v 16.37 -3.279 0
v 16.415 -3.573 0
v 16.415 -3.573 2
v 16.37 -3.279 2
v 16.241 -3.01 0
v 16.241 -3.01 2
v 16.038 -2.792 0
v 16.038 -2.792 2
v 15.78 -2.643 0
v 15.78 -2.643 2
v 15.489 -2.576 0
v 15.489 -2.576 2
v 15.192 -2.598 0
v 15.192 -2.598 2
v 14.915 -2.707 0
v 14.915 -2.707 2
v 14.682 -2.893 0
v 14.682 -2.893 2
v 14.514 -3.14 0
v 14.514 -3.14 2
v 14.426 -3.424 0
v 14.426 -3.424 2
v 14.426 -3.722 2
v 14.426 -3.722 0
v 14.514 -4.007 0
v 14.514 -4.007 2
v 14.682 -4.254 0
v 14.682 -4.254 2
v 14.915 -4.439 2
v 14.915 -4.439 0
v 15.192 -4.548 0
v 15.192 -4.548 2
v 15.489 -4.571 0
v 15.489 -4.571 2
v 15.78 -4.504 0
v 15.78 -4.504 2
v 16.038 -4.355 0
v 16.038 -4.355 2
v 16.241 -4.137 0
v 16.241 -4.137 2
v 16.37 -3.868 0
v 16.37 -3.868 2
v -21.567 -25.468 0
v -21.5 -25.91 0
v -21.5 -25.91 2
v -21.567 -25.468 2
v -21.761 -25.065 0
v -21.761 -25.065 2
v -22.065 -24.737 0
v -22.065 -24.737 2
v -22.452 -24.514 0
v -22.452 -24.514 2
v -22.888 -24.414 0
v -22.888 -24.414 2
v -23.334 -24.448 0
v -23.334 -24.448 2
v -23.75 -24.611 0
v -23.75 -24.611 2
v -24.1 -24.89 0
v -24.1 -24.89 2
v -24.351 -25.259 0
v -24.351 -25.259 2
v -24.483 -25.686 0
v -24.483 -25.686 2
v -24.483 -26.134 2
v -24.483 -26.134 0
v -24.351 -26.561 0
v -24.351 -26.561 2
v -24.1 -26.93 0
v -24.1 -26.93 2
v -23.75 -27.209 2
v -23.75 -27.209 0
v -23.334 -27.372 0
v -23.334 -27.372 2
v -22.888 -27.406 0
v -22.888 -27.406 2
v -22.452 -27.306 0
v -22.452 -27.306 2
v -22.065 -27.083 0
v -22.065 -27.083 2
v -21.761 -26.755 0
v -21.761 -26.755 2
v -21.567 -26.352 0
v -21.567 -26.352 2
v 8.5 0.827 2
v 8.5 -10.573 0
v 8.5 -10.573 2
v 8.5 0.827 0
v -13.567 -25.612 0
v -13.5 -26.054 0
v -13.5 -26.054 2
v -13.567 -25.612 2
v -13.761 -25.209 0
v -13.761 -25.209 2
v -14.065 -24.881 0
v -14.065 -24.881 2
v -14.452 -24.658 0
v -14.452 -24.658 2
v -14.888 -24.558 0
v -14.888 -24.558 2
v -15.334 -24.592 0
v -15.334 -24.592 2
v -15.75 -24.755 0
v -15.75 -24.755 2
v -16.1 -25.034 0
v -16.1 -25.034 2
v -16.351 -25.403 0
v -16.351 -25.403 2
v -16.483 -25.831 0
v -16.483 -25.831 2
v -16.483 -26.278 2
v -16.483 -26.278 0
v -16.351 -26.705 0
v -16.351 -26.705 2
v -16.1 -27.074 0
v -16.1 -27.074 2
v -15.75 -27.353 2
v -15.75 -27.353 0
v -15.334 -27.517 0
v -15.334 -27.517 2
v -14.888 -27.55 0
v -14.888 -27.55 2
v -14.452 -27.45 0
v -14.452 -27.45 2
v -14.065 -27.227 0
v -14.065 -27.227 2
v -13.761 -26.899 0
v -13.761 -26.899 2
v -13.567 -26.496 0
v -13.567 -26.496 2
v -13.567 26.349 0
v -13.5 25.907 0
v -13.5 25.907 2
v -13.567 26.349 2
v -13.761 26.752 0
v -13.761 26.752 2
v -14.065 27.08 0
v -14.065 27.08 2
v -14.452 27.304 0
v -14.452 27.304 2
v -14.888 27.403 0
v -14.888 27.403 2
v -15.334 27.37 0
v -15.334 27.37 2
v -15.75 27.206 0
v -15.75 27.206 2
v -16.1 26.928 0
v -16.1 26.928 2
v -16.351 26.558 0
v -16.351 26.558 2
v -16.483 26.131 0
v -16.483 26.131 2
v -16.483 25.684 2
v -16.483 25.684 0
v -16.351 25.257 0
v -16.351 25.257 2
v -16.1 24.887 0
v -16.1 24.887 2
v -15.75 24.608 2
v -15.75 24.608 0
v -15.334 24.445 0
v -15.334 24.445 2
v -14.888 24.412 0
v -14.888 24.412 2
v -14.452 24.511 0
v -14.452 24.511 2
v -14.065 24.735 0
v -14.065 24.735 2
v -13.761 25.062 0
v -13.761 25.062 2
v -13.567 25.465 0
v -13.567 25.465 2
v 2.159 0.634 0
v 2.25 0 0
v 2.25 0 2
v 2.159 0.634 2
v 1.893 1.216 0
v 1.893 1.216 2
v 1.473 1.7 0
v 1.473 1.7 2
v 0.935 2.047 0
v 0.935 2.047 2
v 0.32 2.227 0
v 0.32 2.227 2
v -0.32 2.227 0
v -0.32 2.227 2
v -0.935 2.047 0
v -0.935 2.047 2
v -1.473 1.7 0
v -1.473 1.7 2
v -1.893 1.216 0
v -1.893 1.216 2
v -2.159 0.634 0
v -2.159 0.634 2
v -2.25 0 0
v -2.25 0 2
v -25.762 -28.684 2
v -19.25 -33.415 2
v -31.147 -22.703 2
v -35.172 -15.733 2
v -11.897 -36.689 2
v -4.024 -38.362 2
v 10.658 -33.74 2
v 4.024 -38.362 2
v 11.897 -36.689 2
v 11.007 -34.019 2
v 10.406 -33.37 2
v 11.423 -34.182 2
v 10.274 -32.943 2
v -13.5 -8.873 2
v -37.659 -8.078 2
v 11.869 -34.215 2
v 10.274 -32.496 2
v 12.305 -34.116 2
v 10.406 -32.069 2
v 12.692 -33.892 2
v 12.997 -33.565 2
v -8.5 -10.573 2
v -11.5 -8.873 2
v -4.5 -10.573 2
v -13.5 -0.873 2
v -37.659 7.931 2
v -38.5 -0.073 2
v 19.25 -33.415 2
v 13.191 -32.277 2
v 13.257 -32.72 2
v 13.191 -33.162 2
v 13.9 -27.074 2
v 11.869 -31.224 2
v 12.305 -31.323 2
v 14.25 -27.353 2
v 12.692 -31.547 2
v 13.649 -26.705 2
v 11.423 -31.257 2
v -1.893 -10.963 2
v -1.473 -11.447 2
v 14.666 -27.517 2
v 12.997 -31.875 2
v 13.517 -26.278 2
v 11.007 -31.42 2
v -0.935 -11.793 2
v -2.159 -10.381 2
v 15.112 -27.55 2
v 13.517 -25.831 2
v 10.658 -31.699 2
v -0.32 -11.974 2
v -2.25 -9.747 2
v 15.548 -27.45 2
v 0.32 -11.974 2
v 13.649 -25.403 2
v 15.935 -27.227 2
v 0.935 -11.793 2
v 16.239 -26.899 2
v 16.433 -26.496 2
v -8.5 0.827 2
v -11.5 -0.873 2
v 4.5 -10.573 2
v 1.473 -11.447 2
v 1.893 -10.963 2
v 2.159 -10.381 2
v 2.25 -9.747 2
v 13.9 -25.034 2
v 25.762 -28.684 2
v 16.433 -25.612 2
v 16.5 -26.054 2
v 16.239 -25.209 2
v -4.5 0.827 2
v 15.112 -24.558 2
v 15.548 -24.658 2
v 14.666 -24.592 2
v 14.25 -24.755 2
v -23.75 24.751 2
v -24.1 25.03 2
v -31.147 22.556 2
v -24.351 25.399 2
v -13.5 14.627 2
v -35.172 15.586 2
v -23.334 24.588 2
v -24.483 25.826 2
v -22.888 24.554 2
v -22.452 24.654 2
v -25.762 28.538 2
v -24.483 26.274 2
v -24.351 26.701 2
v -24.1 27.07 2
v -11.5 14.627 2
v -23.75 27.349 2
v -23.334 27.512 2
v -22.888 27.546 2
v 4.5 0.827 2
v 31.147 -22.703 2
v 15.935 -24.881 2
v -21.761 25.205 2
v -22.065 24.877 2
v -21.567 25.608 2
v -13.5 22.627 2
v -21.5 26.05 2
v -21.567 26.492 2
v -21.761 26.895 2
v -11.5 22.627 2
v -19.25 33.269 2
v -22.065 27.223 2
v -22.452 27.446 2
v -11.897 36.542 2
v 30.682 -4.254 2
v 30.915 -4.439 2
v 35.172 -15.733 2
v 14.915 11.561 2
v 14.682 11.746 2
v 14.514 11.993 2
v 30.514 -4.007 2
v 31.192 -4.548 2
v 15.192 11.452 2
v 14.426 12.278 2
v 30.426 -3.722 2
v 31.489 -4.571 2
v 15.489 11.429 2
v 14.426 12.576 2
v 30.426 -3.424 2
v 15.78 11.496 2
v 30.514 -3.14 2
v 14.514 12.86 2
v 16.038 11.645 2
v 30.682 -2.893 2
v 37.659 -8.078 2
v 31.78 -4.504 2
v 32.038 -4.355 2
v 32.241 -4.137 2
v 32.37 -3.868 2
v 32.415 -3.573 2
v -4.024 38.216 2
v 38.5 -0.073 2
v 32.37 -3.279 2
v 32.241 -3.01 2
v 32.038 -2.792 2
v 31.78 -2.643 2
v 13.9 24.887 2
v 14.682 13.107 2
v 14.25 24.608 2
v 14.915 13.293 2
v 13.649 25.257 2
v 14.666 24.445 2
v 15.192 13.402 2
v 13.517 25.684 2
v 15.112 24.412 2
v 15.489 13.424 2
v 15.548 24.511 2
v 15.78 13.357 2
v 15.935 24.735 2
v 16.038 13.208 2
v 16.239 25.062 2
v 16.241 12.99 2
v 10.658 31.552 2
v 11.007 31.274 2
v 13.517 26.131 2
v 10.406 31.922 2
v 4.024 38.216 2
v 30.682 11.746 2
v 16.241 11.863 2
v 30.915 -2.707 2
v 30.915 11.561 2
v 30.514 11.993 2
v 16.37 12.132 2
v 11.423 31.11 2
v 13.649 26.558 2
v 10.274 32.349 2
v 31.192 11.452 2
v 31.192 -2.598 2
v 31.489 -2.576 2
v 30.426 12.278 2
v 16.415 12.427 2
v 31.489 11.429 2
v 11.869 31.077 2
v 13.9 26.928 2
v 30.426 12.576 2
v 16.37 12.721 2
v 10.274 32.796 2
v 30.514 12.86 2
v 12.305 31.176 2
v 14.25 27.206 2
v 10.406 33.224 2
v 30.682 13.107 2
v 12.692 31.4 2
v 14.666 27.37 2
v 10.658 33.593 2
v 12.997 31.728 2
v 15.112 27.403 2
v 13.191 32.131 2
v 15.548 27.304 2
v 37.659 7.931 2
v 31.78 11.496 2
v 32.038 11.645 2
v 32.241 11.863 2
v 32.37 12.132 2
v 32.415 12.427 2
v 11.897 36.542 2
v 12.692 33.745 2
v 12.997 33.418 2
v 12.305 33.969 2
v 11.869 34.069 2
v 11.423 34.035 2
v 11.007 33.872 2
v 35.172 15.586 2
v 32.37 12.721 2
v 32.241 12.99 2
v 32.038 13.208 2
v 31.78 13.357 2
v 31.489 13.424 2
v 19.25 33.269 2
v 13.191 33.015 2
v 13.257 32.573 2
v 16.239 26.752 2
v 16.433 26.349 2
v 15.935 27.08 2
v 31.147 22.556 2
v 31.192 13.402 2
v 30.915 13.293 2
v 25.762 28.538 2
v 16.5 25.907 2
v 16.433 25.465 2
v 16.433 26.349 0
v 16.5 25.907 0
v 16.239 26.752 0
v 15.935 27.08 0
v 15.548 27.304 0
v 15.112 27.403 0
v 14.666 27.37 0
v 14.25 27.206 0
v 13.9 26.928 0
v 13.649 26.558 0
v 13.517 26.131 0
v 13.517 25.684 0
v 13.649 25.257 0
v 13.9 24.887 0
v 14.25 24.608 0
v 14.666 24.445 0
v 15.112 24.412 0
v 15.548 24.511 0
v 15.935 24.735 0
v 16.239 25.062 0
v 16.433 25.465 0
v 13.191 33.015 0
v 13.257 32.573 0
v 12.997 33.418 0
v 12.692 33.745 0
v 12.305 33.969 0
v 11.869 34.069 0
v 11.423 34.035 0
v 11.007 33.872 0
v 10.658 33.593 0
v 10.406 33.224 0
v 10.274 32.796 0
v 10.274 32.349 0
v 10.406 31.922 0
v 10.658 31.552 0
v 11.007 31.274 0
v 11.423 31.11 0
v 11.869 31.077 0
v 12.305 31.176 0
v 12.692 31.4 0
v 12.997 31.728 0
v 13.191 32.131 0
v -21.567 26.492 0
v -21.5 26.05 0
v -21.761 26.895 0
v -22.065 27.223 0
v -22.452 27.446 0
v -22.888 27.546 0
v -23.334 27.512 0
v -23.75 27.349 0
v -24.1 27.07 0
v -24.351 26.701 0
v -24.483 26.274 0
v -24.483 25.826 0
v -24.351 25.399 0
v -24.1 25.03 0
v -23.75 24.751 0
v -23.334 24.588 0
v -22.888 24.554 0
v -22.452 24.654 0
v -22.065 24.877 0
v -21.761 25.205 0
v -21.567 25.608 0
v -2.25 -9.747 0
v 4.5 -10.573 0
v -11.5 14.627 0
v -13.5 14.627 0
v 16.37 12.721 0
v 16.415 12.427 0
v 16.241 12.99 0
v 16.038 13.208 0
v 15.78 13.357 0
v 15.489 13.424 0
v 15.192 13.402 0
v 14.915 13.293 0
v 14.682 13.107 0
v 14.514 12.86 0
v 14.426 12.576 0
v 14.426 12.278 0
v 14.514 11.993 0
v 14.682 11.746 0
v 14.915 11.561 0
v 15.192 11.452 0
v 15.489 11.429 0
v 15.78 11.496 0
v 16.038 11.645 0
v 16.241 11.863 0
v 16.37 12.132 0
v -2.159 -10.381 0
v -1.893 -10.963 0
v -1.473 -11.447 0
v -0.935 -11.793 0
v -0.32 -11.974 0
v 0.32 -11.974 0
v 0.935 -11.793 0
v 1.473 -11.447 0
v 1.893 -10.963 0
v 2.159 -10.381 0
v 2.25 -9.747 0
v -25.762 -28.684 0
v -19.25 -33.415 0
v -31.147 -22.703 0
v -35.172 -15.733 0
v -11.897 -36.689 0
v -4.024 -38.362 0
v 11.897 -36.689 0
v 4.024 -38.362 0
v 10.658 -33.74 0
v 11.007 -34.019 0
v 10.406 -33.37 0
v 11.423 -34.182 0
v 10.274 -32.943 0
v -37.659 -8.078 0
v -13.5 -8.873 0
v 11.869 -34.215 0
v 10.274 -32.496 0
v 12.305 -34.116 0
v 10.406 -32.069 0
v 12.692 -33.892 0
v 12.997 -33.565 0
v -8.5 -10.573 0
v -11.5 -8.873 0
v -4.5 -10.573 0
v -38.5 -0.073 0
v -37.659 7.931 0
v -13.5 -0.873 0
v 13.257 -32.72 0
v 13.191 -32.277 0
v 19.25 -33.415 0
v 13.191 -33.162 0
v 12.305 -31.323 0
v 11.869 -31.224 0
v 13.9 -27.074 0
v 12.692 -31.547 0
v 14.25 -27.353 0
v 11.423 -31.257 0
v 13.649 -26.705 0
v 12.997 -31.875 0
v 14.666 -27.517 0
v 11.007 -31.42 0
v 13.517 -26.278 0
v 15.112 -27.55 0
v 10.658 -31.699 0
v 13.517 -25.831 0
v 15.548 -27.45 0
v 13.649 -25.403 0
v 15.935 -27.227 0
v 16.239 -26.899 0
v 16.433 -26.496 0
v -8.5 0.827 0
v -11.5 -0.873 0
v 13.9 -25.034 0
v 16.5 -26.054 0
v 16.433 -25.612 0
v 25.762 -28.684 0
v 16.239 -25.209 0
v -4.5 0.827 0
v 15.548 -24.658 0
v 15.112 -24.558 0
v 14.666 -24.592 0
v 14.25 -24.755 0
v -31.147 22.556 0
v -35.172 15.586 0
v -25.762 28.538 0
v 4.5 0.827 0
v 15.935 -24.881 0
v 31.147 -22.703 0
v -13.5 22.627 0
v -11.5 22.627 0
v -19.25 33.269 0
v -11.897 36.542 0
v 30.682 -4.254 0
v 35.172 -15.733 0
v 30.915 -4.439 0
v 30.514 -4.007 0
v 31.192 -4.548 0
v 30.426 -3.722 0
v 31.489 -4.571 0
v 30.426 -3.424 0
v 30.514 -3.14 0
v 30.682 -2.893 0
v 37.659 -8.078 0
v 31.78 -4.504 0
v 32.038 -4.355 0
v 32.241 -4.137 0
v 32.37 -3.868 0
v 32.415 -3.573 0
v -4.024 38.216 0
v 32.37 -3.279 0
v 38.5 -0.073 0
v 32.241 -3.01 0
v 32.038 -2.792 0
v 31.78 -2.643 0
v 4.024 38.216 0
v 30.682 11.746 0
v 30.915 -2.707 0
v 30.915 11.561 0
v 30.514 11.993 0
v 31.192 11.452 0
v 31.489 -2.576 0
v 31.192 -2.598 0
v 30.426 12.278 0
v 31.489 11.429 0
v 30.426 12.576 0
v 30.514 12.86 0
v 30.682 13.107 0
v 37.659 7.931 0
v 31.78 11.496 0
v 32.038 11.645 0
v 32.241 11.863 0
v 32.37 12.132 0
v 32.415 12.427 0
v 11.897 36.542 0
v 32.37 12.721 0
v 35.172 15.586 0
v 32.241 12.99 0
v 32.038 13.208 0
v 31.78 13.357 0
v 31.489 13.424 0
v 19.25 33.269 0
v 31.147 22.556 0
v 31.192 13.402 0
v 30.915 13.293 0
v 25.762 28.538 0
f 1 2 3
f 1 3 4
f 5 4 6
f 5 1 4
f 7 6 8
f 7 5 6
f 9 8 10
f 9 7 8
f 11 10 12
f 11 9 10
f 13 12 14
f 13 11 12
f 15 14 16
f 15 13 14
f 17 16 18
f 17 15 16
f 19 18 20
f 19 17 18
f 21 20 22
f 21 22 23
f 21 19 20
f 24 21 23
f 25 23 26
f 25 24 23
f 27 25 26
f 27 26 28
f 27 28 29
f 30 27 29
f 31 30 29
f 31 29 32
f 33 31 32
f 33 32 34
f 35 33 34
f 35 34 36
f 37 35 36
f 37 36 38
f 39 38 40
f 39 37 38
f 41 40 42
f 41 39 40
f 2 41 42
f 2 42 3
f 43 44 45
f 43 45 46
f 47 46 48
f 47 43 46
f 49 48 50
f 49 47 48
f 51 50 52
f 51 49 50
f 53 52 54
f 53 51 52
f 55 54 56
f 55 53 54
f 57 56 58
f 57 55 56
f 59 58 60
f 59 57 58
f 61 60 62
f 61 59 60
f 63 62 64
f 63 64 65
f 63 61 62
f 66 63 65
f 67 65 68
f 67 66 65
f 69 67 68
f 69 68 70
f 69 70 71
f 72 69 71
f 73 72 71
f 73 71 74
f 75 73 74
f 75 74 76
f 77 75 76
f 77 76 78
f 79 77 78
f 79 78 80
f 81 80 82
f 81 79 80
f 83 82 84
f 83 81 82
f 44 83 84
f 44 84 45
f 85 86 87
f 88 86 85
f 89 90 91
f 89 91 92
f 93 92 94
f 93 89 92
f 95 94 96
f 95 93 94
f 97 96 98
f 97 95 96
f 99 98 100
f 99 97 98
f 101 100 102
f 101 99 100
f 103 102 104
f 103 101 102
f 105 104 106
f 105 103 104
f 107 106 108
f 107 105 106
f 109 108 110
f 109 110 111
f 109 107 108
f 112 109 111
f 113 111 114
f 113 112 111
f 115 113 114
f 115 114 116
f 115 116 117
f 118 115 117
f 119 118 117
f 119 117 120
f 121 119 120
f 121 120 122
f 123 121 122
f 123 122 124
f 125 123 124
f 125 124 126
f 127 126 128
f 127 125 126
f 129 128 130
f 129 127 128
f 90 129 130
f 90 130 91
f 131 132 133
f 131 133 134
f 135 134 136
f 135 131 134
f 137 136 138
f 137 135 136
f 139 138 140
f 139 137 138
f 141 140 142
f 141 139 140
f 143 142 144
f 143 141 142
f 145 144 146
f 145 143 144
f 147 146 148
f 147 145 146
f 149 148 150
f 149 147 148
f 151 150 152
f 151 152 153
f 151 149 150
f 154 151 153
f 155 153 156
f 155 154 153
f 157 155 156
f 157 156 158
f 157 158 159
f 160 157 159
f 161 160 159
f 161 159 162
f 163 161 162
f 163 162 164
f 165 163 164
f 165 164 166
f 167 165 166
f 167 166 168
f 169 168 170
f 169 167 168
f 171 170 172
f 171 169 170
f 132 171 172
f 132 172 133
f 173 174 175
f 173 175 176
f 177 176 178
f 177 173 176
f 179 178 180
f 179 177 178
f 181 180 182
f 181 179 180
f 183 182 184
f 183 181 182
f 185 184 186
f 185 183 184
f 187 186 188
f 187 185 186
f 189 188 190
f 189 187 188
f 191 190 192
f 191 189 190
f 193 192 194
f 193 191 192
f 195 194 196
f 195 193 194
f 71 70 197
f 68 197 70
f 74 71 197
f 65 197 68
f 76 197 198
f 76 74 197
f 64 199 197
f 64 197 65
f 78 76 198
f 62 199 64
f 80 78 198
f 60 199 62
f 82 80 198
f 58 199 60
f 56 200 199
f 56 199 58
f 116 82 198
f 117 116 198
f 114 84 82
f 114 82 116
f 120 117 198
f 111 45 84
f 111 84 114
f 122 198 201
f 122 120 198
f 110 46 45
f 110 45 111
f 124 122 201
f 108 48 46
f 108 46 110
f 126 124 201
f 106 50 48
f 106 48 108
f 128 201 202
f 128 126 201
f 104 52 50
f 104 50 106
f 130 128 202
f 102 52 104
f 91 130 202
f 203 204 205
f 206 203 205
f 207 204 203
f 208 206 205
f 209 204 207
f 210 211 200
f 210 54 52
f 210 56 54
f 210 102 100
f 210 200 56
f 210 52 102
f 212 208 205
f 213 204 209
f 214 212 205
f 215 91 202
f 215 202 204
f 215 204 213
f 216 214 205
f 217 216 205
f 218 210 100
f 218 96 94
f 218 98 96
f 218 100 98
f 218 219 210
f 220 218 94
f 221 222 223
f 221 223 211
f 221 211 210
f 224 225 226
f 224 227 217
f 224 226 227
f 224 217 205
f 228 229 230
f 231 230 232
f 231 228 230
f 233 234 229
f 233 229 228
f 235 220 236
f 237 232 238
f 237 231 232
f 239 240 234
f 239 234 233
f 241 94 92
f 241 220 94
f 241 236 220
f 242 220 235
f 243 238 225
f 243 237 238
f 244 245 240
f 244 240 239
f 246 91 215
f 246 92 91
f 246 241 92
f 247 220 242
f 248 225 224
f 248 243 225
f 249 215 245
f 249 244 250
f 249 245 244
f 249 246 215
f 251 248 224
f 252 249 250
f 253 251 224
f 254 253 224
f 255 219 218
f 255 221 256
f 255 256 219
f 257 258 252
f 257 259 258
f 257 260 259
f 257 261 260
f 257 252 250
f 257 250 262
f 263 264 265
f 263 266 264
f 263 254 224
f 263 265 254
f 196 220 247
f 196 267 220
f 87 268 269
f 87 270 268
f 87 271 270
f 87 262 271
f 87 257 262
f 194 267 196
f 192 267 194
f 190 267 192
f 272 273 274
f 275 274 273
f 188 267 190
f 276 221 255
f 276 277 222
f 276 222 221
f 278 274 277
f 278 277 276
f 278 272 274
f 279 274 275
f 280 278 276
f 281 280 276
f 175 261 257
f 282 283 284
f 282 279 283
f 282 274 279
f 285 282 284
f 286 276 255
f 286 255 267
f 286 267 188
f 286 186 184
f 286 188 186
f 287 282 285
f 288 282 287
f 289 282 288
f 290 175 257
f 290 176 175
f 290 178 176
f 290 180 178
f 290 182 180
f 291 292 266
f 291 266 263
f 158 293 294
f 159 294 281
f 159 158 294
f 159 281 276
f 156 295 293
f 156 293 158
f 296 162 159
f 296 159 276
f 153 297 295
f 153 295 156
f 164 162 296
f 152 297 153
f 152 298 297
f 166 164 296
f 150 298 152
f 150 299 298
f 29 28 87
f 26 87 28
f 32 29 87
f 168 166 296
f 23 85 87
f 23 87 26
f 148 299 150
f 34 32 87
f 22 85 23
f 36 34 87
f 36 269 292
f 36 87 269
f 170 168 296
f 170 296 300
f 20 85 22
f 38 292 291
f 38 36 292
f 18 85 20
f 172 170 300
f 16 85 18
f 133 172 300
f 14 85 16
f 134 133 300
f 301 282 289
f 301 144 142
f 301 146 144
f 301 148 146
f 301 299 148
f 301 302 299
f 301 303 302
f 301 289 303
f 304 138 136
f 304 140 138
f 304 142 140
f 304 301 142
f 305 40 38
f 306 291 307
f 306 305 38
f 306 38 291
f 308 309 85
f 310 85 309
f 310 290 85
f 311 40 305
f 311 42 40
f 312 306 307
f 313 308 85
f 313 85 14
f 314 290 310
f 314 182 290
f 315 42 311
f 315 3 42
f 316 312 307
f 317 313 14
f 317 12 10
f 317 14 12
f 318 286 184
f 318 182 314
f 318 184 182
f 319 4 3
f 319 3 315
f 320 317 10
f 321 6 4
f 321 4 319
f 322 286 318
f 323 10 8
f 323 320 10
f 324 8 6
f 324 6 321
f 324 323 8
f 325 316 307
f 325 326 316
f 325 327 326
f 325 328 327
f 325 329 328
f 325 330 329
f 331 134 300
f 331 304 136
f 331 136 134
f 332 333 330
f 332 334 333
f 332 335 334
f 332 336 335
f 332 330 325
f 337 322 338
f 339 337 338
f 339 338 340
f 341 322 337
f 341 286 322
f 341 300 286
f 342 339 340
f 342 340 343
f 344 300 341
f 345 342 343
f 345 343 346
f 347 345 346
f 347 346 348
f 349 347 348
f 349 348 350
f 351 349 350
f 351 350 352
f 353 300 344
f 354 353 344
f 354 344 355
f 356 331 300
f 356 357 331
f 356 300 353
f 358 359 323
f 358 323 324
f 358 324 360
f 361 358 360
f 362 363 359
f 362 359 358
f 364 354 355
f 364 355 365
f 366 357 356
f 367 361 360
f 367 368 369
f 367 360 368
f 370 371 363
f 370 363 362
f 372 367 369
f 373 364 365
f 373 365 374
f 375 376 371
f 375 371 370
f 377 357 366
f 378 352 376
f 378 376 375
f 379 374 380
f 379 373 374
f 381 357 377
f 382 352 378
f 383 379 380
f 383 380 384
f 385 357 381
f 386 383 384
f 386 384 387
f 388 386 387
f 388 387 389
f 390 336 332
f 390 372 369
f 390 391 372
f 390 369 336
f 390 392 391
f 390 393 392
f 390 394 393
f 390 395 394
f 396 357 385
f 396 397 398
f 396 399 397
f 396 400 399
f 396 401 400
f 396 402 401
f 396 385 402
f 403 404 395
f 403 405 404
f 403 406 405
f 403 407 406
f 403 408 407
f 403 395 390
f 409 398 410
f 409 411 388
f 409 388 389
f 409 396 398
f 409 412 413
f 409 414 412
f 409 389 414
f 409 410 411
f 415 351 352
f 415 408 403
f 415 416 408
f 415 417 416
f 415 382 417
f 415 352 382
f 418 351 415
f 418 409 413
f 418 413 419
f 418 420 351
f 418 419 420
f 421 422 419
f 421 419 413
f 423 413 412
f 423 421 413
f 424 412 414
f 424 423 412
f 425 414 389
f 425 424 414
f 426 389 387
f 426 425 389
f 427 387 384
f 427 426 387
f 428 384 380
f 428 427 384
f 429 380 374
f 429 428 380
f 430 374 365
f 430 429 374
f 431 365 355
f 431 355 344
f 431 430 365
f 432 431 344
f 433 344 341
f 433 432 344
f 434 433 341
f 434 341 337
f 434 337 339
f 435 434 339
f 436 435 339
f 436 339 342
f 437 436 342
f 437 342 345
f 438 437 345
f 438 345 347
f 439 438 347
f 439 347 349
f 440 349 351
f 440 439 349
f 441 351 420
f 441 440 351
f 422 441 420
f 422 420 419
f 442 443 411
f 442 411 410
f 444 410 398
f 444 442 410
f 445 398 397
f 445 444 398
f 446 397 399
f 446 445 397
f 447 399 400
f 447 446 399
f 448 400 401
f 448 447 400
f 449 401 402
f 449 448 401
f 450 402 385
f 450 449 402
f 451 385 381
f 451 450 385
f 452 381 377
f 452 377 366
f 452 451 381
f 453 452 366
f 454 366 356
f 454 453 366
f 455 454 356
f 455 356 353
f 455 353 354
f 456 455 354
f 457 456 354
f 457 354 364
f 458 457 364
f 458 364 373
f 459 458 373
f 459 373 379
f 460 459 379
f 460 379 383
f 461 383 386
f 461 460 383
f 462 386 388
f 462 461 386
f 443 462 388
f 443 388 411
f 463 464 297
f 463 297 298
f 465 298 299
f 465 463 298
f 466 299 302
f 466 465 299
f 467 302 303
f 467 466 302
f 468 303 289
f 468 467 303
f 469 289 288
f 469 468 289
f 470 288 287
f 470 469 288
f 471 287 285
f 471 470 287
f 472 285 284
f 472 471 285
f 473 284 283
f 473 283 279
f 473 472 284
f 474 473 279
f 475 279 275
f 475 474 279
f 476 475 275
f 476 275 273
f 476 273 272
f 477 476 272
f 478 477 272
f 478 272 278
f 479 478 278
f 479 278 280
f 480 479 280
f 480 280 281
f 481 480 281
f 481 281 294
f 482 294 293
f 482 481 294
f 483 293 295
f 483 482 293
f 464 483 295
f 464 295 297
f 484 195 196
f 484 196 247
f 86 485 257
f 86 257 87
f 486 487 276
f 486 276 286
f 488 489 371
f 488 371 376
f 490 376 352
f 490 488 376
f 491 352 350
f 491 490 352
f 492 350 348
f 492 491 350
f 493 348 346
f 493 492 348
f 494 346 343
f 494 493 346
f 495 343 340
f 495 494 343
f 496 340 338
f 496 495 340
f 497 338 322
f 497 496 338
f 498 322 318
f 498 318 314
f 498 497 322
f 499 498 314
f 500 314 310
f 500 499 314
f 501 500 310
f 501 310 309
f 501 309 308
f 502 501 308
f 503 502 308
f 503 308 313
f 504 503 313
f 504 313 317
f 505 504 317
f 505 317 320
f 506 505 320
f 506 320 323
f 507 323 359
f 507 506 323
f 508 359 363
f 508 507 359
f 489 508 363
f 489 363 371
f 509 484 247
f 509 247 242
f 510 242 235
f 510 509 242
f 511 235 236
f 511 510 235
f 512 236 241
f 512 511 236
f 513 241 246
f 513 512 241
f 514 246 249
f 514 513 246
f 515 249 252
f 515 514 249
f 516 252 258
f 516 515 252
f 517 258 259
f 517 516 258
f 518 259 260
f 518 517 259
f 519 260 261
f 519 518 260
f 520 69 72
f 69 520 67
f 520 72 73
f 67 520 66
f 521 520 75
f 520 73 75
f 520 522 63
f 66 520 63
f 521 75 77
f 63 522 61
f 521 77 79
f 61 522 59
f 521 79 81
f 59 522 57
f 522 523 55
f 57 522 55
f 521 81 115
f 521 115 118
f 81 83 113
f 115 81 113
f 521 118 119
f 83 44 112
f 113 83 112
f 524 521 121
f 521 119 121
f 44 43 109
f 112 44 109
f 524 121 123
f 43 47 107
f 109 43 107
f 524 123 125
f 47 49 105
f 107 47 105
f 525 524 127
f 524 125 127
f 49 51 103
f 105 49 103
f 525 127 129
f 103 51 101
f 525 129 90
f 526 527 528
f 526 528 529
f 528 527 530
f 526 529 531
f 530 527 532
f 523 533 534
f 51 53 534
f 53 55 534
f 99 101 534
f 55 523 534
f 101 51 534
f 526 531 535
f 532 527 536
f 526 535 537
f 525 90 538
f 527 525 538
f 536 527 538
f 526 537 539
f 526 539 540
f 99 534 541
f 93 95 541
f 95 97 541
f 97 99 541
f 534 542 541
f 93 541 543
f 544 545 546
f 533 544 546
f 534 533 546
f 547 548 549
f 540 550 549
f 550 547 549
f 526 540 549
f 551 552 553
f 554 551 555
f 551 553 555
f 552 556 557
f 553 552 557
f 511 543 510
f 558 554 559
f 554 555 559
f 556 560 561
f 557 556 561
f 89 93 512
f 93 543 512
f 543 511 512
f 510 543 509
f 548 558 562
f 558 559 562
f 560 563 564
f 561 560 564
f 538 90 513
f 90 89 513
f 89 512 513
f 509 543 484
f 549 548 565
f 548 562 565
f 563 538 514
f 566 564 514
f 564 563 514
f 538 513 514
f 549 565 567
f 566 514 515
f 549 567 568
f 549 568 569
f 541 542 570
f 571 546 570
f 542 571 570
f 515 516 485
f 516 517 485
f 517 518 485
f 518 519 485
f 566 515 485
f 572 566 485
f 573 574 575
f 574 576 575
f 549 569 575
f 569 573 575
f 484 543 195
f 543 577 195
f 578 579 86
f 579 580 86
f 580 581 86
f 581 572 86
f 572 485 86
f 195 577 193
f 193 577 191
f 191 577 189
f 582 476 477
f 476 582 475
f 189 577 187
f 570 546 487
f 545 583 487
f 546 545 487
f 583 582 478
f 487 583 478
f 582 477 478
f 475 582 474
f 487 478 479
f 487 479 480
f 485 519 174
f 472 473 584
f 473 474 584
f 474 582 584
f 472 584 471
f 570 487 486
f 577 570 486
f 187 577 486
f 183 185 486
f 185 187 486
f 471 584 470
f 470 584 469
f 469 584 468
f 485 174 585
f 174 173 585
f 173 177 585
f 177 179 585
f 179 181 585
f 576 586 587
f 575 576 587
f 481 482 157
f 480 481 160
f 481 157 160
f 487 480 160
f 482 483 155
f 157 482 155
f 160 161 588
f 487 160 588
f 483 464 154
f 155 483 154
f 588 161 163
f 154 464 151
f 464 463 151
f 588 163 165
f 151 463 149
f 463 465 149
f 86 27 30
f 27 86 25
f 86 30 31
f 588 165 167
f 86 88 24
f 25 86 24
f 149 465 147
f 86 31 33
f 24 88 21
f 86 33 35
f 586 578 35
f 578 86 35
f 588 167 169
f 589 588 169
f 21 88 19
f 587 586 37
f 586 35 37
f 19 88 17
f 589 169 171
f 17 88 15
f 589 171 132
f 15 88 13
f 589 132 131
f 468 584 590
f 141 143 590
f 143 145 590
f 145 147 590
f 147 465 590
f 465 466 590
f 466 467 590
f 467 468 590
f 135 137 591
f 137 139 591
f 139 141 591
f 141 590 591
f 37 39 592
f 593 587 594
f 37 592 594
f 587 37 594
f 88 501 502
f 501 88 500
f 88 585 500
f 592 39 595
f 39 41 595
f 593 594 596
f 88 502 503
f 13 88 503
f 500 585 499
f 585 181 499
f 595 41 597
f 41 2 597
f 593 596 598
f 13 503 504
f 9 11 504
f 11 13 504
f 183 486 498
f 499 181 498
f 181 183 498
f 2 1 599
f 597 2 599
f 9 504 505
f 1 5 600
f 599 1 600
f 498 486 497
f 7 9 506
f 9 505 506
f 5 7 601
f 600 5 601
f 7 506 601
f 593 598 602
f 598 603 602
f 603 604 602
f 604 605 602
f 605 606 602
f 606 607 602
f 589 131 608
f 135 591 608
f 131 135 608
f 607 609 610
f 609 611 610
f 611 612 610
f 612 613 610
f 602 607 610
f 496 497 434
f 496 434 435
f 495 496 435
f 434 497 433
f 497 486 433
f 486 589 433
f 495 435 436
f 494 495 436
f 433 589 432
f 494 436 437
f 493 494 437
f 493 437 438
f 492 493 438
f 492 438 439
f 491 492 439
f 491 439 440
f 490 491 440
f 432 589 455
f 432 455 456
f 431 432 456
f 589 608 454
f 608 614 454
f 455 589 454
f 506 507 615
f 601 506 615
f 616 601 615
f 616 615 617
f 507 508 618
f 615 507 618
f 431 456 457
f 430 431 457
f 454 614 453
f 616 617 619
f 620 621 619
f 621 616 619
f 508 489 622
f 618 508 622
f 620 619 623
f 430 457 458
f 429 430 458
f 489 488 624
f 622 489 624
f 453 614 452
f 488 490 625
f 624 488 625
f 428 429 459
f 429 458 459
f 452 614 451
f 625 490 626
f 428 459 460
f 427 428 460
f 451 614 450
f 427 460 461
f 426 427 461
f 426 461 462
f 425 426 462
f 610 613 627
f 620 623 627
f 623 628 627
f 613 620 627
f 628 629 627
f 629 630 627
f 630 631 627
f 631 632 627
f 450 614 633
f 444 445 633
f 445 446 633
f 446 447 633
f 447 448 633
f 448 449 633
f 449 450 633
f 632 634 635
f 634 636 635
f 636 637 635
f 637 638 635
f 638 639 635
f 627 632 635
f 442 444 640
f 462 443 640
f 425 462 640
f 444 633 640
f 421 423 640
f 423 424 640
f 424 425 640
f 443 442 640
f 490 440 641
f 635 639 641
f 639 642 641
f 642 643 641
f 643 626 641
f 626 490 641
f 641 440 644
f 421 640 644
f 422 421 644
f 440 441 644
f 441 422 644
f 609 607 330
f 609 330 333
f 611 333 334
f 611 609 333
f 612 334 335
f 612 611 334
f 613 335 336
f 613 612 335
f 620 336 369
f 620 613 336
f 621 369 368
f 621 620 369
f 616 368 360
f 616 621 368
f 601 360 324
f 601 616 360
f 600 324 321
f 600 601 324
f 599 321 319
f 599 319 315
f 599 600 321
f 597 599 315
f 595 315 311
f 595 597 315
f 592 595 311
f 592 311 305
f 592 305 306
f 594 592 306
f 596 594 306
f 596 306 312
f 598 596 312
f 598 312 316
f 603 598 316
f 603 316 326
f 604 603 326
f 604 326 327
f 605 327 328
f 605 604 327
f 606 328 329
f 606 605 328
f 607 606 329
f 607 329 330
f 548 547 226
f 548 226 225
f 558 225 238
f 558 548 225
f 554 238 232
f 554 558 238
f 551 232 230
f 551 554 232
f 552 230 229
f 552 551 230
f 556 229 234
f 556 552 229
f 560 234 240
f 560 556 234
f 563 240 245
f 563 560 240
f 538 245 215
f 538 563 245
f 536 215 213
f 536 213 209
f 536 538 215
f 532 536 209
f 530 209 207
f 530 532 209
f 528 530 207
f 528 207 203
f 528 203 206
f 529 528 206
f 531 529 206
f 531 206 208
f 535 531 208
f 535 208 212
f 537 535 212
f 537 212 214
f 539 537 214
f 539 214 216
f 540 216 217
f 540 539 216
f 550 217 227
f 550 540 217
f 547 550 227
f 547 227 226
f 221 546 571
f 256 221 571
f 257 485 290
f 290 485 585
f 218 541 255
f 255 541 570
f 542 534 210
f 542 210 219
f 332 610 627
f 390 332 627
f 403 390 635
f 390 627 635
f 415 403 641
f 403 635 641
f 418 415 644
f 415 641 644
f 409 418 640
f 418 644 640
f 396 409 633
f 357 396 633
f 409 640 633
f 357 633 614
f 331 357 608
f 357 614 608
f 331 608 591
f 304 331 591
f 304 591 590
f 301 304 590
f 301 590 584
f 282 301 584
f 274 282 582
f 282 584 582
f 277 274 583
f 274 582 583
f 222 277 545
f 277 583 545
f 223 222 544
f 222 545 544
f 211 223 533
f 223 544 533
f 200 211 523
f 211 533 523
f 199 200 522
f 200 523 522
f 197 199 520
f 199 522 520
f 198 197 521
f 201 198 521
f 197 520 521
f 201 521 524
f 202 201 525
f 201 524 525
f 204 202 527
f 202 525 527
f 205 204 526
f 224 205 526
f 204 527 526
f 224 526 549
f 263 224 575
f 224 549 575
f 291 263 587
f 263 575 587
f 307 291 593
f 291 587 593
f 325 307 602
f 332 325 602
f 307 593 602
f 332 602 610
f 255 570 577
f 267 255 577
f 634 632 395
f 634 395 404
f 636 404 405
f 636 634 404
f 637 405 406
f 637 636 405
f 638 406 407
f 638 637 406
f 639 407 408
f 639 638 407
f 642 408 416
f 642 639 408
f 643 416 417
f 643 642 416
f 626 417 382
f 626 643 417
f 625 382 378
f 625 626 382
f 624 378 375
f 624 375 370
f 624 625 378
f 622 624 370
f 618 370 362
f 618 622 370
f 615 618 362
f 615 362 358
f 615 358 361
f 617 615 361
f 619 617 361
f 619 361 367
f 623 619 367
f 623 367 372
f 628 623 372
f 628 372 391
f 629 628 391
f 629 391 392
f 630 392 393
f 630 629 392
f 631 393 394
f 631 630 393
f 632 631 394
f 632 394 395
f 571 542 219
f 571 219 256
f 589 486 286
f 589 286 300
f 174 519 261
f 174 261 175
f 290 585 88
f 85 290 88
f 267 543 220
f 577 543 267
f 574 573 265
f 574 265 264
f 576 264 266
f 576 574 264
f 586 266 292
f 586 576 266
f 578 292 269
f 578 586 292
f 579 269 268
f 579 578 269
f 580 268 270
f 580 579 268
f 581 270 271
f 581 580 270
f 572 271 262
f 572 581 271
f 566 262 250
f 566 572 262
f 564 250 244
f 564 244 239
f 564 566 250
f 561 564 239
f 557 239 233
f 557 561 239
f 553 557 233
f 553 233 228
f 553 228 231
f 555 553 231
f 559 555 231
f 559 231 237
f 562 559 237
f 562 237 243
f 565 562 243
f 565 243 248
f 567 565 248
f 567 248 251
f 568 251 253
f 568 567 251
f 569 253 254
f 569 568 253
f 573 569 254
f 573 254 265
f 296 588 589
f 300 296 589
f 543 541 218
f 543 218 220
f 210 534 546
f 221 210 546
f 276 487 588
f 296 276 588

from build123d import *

# Parameters (mm, degrees)
MODEL_R             = 38.5
MODEL_R_2           = 1.5
MODEL_R_3           = 1
MODEL_W             = 2
MODEL_H             = 8
MODEL_W_2           = 4
MODEL_H_2           = 11.4
BOSS_EXTRUDE1_DEPTH = 2


with BuildPart() as part:
    # Model → Boss-Extrude1 (new body)
    with BuildSketch(Plane.XY):
        with Locations((0, -0.073397172)):
            Circle(MODEL_R)
        with Locations((-23, 26.05)):
            Circle(MODEL_R_2, mode=Mode.SUBTRACT)
        with Locations((11.757144545, -32.719523315)):
            Circle(MODEL_R_2, mode=Mode.SUBTRACT)
        with Locations((11.757144545, 32.572728971)):
            Circle(MODEL_R_2, mode=Mode.SUBTRACT)
        with Locations((31.414701296, 12.426602828)):
            Circle(MODEL_R_3, mode=Mode.SUBTRACT)
        with Locations((31.414701296, -3.573397172)):
            Circle(MODEL_R_3, mode=Mode.SUBTRACT)
        with Locations((15.414701296, 12.426602828)):
            Circle(MODEL_R_3, mode=Mode.SUBTRACT)
        with Locations((15.414701296, -3.573397172)):
            Circle(MODEL_R_3, mode=Mode.SUBTRACT)
        with Locations((-23, -25.91)):
            Circle(MODEL_R_2, mode=Mode.SUBTRACT)
        with Locations((-15, -26.054159286)):
            Circle(MODEL_R_2, mode=Mode.SUBTRACT)
        with Locations((15, 25.907364941)):
            Circle(MODEL_R_2, mode=Mode.SUBTRACT)
        with Locations((-15, 25.907364941)):
            Circle(MODEL_R_2, mode=Mode.SUBTRACT)
        with Locations((15, -26.054159286)):
            Circle(MODEL_R_2, mode=Mode.SUBTRACT)
        with Locations((-12.5, -4.873397172)):
            Rectangle(MODEL_W, MODEL_H, mode=Mode.SUBTRACT)
        with Locations((-12.5, 18.626602828)):
            Rectangle(MODEL_W, MODEL_H, mode=Mode.SUBTRACT)
        with Locations((-6.5, -4.873397172)):
            Rectangle(MODEL_W_2, MODEL_H_2, mode=Mode.SUBTRACT)
        with Locations((6.5, -4.873397172)):
            Rectangle(MODEL_W_2, MODEL_H_2, mode=Mode.SUBTRACT)
        with BuildLine():
            Line((-2.25, 0), (-2.25, -9.746794345))
            ThreePointArc((-2.25, -9.746794345), (0, -11.996794345), (2.25, -9.746794345))
            Line((2.25, -9.746794345), (2.25, 0))
            ThreePointArc((2.25, 0), (0, 2.25), (-2.25, 0))
        make_face(mode=Mode.SUBTRACT)
    extrude(amount=BOSS_EXTRUDE1_DEPTH)


solid = part.part
